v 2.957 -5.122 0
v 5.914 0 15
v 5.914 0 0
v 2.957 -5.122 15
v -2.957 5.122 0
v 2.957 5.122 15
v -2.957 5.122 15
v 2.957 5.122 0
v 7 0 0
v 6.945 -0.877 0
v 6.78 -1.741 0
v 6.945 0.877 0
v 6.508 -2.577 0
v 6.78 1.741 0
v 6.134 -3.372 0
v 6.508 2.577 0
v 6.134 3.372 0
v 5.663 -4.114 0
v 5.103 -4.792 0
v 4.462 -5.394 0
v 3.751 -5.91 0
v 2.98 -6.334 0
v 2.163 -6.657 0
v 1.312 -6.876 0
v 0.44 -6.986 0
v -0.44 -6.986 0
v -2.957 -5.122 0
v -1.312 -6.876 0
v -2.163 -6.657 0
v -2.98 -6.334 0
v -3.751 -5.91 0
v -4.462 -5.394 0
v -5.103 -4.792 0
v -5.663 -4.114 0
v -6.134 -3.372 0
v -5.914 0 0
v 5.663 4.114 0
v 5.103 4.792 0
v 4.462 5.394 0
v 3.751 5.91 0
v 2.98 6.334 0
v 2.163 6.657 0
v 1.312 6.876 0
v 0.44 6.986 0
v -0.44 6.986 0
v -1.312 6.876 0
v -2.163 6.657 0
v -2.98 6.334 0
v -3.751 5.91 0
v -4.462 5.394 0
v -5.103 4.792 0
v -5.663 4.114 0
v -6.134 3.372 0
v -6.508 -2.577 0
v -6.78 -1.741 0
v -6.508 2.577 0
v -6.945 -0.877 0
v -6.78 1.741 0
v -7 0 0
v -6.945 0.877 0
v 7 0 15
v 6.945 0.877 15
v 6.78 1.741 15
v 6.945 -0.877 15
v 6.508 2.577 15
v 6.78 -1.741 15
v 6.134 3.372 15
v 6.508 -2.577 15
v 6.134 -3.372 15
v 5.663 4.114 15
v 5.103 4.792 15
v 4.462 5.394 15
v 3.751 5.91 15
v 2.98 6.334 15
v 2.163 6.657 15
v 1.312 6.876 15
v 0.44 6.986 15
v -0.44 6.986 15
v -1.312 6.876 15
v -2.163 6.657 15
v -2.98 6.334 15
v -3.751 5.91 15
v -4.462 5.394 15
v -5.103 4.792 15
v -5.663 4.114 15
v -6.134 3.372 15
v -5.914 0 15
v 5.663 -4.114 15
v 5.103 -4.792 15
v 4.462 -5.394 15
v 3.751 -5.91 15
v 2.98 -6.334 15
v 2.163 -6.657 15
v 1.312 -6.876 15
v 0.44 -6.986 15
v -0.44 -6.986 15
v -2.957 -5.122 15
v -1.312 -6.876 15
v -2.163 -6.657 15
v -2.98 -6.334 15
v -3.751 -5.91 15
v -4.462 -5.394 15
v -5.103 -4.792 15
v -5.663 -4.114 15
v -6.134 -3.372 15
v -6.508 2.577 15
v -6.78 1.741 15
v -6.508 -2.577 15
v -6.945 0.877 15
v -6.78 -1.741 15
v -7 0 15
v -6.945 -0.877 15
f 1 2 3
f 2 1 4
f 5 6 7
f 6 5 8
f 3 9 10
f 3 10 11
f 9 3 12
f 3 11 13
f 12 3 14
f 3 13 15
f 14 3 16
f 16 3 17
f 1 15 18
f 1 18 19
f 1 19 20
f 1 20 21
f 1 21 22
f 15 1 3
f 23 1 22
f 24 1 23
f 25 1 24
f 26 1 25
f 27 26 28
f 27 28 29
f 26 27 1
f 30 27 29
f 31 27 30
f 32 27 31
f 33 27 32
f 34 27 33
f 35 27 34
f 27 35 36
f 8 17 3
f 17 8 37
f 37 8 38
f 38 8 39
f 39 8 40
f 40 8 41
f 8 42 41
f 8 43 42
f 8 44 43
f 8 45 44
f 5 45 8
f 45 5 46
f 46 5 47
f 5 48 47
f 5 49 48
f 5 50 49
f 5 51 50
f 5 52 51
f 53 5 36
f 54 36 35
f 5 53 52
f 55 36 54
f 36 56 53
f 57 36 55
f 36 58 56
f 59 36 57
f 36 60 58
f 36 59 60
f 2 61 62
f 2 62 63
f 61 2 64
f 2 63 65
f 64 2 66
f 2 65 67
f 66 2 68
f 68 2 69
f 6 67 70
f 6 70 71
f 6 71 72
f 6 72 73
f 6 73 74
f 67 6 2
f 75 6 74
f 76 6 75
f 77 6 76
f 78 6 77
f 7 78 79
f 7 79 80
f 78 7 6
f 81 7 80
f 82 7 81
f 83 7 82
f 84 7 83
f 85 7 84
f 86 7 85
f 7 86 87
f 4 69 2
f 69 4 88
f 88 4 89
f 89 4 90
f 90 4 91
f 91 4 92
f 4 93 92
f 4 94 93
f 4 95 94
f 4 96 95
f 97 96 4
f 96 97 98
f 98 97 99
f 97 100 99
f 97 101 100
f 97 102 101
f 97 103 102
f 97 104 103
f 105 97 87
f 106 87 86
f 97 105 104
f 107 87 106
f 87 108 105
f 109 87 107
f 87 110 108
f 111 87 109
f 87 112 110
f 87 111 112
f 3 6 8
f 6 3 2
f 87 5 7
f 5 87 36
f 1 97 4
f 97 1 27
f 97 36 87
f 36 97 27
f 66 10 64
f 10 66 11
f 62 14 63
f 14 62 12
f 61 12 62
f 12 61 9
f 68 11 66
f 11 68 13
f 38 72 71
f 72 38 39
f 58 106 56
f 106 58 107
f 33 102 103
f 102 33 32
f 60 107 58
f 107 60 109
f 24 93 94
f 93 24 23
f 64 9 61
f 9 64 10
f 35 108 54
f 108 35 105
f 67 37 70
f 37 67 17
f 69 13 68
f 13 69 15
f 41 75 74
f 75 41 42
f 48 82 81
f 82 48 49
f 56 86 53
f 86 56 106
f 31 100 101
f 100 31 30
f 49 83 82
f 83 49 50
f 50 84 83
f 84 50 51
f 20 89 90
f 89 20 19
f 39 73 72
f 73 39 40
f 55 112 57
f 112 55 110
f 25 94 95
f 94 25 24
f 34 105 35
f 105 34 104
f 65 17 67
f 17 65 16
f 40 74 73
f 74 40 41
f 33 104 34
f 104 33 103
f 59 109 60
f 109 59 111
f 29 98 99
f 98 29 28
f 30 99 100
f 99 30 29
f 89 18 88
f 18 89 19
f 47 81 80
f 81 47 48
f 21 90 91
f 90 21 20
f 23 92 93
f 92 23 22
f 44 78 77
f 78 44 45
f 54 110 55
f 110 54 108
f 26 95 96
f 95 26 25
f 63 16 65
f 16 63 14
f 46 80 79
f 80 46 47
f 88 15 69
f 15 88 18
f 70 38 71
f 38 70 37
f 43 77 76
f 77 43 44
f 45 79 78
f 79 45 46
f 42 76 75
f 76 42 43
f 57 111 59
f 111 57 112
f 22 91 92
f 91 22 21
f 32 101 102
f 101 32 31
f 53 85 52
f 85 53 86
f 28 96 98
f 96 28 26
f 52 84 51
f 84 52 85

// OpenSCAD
$fn = 50;


difference() {
	union() {
		cylinder(h = 15, r = 7.0000000000);
	}
	union() {
		translate(v = [0, 0, 0]) {
			rotate(a = [0, 0, 0]) {
				difference() {
					union() {
						#linear_extrude(height = 15) {
							polygon(points = [[5.9142500000, 0.0000000000], [2.9571250000, 5.1218907443], [-2.9571250000, 5.1218907443], [-5.9142500000, 0.0000000000], [-2.9571250000, -5.1218907443], [2.9571250000, -5.1218907443]]);
						}
					}
					union();
				}
			}
		}
		translate(v = [0, 0, -100]) {
			cylinder(h = 200, r = 3.2500000000);
		}
		translate(v = [0, 0, -100]) {
			cylinder(h = 200, r = 1.8000000000);
		}
	}
}
